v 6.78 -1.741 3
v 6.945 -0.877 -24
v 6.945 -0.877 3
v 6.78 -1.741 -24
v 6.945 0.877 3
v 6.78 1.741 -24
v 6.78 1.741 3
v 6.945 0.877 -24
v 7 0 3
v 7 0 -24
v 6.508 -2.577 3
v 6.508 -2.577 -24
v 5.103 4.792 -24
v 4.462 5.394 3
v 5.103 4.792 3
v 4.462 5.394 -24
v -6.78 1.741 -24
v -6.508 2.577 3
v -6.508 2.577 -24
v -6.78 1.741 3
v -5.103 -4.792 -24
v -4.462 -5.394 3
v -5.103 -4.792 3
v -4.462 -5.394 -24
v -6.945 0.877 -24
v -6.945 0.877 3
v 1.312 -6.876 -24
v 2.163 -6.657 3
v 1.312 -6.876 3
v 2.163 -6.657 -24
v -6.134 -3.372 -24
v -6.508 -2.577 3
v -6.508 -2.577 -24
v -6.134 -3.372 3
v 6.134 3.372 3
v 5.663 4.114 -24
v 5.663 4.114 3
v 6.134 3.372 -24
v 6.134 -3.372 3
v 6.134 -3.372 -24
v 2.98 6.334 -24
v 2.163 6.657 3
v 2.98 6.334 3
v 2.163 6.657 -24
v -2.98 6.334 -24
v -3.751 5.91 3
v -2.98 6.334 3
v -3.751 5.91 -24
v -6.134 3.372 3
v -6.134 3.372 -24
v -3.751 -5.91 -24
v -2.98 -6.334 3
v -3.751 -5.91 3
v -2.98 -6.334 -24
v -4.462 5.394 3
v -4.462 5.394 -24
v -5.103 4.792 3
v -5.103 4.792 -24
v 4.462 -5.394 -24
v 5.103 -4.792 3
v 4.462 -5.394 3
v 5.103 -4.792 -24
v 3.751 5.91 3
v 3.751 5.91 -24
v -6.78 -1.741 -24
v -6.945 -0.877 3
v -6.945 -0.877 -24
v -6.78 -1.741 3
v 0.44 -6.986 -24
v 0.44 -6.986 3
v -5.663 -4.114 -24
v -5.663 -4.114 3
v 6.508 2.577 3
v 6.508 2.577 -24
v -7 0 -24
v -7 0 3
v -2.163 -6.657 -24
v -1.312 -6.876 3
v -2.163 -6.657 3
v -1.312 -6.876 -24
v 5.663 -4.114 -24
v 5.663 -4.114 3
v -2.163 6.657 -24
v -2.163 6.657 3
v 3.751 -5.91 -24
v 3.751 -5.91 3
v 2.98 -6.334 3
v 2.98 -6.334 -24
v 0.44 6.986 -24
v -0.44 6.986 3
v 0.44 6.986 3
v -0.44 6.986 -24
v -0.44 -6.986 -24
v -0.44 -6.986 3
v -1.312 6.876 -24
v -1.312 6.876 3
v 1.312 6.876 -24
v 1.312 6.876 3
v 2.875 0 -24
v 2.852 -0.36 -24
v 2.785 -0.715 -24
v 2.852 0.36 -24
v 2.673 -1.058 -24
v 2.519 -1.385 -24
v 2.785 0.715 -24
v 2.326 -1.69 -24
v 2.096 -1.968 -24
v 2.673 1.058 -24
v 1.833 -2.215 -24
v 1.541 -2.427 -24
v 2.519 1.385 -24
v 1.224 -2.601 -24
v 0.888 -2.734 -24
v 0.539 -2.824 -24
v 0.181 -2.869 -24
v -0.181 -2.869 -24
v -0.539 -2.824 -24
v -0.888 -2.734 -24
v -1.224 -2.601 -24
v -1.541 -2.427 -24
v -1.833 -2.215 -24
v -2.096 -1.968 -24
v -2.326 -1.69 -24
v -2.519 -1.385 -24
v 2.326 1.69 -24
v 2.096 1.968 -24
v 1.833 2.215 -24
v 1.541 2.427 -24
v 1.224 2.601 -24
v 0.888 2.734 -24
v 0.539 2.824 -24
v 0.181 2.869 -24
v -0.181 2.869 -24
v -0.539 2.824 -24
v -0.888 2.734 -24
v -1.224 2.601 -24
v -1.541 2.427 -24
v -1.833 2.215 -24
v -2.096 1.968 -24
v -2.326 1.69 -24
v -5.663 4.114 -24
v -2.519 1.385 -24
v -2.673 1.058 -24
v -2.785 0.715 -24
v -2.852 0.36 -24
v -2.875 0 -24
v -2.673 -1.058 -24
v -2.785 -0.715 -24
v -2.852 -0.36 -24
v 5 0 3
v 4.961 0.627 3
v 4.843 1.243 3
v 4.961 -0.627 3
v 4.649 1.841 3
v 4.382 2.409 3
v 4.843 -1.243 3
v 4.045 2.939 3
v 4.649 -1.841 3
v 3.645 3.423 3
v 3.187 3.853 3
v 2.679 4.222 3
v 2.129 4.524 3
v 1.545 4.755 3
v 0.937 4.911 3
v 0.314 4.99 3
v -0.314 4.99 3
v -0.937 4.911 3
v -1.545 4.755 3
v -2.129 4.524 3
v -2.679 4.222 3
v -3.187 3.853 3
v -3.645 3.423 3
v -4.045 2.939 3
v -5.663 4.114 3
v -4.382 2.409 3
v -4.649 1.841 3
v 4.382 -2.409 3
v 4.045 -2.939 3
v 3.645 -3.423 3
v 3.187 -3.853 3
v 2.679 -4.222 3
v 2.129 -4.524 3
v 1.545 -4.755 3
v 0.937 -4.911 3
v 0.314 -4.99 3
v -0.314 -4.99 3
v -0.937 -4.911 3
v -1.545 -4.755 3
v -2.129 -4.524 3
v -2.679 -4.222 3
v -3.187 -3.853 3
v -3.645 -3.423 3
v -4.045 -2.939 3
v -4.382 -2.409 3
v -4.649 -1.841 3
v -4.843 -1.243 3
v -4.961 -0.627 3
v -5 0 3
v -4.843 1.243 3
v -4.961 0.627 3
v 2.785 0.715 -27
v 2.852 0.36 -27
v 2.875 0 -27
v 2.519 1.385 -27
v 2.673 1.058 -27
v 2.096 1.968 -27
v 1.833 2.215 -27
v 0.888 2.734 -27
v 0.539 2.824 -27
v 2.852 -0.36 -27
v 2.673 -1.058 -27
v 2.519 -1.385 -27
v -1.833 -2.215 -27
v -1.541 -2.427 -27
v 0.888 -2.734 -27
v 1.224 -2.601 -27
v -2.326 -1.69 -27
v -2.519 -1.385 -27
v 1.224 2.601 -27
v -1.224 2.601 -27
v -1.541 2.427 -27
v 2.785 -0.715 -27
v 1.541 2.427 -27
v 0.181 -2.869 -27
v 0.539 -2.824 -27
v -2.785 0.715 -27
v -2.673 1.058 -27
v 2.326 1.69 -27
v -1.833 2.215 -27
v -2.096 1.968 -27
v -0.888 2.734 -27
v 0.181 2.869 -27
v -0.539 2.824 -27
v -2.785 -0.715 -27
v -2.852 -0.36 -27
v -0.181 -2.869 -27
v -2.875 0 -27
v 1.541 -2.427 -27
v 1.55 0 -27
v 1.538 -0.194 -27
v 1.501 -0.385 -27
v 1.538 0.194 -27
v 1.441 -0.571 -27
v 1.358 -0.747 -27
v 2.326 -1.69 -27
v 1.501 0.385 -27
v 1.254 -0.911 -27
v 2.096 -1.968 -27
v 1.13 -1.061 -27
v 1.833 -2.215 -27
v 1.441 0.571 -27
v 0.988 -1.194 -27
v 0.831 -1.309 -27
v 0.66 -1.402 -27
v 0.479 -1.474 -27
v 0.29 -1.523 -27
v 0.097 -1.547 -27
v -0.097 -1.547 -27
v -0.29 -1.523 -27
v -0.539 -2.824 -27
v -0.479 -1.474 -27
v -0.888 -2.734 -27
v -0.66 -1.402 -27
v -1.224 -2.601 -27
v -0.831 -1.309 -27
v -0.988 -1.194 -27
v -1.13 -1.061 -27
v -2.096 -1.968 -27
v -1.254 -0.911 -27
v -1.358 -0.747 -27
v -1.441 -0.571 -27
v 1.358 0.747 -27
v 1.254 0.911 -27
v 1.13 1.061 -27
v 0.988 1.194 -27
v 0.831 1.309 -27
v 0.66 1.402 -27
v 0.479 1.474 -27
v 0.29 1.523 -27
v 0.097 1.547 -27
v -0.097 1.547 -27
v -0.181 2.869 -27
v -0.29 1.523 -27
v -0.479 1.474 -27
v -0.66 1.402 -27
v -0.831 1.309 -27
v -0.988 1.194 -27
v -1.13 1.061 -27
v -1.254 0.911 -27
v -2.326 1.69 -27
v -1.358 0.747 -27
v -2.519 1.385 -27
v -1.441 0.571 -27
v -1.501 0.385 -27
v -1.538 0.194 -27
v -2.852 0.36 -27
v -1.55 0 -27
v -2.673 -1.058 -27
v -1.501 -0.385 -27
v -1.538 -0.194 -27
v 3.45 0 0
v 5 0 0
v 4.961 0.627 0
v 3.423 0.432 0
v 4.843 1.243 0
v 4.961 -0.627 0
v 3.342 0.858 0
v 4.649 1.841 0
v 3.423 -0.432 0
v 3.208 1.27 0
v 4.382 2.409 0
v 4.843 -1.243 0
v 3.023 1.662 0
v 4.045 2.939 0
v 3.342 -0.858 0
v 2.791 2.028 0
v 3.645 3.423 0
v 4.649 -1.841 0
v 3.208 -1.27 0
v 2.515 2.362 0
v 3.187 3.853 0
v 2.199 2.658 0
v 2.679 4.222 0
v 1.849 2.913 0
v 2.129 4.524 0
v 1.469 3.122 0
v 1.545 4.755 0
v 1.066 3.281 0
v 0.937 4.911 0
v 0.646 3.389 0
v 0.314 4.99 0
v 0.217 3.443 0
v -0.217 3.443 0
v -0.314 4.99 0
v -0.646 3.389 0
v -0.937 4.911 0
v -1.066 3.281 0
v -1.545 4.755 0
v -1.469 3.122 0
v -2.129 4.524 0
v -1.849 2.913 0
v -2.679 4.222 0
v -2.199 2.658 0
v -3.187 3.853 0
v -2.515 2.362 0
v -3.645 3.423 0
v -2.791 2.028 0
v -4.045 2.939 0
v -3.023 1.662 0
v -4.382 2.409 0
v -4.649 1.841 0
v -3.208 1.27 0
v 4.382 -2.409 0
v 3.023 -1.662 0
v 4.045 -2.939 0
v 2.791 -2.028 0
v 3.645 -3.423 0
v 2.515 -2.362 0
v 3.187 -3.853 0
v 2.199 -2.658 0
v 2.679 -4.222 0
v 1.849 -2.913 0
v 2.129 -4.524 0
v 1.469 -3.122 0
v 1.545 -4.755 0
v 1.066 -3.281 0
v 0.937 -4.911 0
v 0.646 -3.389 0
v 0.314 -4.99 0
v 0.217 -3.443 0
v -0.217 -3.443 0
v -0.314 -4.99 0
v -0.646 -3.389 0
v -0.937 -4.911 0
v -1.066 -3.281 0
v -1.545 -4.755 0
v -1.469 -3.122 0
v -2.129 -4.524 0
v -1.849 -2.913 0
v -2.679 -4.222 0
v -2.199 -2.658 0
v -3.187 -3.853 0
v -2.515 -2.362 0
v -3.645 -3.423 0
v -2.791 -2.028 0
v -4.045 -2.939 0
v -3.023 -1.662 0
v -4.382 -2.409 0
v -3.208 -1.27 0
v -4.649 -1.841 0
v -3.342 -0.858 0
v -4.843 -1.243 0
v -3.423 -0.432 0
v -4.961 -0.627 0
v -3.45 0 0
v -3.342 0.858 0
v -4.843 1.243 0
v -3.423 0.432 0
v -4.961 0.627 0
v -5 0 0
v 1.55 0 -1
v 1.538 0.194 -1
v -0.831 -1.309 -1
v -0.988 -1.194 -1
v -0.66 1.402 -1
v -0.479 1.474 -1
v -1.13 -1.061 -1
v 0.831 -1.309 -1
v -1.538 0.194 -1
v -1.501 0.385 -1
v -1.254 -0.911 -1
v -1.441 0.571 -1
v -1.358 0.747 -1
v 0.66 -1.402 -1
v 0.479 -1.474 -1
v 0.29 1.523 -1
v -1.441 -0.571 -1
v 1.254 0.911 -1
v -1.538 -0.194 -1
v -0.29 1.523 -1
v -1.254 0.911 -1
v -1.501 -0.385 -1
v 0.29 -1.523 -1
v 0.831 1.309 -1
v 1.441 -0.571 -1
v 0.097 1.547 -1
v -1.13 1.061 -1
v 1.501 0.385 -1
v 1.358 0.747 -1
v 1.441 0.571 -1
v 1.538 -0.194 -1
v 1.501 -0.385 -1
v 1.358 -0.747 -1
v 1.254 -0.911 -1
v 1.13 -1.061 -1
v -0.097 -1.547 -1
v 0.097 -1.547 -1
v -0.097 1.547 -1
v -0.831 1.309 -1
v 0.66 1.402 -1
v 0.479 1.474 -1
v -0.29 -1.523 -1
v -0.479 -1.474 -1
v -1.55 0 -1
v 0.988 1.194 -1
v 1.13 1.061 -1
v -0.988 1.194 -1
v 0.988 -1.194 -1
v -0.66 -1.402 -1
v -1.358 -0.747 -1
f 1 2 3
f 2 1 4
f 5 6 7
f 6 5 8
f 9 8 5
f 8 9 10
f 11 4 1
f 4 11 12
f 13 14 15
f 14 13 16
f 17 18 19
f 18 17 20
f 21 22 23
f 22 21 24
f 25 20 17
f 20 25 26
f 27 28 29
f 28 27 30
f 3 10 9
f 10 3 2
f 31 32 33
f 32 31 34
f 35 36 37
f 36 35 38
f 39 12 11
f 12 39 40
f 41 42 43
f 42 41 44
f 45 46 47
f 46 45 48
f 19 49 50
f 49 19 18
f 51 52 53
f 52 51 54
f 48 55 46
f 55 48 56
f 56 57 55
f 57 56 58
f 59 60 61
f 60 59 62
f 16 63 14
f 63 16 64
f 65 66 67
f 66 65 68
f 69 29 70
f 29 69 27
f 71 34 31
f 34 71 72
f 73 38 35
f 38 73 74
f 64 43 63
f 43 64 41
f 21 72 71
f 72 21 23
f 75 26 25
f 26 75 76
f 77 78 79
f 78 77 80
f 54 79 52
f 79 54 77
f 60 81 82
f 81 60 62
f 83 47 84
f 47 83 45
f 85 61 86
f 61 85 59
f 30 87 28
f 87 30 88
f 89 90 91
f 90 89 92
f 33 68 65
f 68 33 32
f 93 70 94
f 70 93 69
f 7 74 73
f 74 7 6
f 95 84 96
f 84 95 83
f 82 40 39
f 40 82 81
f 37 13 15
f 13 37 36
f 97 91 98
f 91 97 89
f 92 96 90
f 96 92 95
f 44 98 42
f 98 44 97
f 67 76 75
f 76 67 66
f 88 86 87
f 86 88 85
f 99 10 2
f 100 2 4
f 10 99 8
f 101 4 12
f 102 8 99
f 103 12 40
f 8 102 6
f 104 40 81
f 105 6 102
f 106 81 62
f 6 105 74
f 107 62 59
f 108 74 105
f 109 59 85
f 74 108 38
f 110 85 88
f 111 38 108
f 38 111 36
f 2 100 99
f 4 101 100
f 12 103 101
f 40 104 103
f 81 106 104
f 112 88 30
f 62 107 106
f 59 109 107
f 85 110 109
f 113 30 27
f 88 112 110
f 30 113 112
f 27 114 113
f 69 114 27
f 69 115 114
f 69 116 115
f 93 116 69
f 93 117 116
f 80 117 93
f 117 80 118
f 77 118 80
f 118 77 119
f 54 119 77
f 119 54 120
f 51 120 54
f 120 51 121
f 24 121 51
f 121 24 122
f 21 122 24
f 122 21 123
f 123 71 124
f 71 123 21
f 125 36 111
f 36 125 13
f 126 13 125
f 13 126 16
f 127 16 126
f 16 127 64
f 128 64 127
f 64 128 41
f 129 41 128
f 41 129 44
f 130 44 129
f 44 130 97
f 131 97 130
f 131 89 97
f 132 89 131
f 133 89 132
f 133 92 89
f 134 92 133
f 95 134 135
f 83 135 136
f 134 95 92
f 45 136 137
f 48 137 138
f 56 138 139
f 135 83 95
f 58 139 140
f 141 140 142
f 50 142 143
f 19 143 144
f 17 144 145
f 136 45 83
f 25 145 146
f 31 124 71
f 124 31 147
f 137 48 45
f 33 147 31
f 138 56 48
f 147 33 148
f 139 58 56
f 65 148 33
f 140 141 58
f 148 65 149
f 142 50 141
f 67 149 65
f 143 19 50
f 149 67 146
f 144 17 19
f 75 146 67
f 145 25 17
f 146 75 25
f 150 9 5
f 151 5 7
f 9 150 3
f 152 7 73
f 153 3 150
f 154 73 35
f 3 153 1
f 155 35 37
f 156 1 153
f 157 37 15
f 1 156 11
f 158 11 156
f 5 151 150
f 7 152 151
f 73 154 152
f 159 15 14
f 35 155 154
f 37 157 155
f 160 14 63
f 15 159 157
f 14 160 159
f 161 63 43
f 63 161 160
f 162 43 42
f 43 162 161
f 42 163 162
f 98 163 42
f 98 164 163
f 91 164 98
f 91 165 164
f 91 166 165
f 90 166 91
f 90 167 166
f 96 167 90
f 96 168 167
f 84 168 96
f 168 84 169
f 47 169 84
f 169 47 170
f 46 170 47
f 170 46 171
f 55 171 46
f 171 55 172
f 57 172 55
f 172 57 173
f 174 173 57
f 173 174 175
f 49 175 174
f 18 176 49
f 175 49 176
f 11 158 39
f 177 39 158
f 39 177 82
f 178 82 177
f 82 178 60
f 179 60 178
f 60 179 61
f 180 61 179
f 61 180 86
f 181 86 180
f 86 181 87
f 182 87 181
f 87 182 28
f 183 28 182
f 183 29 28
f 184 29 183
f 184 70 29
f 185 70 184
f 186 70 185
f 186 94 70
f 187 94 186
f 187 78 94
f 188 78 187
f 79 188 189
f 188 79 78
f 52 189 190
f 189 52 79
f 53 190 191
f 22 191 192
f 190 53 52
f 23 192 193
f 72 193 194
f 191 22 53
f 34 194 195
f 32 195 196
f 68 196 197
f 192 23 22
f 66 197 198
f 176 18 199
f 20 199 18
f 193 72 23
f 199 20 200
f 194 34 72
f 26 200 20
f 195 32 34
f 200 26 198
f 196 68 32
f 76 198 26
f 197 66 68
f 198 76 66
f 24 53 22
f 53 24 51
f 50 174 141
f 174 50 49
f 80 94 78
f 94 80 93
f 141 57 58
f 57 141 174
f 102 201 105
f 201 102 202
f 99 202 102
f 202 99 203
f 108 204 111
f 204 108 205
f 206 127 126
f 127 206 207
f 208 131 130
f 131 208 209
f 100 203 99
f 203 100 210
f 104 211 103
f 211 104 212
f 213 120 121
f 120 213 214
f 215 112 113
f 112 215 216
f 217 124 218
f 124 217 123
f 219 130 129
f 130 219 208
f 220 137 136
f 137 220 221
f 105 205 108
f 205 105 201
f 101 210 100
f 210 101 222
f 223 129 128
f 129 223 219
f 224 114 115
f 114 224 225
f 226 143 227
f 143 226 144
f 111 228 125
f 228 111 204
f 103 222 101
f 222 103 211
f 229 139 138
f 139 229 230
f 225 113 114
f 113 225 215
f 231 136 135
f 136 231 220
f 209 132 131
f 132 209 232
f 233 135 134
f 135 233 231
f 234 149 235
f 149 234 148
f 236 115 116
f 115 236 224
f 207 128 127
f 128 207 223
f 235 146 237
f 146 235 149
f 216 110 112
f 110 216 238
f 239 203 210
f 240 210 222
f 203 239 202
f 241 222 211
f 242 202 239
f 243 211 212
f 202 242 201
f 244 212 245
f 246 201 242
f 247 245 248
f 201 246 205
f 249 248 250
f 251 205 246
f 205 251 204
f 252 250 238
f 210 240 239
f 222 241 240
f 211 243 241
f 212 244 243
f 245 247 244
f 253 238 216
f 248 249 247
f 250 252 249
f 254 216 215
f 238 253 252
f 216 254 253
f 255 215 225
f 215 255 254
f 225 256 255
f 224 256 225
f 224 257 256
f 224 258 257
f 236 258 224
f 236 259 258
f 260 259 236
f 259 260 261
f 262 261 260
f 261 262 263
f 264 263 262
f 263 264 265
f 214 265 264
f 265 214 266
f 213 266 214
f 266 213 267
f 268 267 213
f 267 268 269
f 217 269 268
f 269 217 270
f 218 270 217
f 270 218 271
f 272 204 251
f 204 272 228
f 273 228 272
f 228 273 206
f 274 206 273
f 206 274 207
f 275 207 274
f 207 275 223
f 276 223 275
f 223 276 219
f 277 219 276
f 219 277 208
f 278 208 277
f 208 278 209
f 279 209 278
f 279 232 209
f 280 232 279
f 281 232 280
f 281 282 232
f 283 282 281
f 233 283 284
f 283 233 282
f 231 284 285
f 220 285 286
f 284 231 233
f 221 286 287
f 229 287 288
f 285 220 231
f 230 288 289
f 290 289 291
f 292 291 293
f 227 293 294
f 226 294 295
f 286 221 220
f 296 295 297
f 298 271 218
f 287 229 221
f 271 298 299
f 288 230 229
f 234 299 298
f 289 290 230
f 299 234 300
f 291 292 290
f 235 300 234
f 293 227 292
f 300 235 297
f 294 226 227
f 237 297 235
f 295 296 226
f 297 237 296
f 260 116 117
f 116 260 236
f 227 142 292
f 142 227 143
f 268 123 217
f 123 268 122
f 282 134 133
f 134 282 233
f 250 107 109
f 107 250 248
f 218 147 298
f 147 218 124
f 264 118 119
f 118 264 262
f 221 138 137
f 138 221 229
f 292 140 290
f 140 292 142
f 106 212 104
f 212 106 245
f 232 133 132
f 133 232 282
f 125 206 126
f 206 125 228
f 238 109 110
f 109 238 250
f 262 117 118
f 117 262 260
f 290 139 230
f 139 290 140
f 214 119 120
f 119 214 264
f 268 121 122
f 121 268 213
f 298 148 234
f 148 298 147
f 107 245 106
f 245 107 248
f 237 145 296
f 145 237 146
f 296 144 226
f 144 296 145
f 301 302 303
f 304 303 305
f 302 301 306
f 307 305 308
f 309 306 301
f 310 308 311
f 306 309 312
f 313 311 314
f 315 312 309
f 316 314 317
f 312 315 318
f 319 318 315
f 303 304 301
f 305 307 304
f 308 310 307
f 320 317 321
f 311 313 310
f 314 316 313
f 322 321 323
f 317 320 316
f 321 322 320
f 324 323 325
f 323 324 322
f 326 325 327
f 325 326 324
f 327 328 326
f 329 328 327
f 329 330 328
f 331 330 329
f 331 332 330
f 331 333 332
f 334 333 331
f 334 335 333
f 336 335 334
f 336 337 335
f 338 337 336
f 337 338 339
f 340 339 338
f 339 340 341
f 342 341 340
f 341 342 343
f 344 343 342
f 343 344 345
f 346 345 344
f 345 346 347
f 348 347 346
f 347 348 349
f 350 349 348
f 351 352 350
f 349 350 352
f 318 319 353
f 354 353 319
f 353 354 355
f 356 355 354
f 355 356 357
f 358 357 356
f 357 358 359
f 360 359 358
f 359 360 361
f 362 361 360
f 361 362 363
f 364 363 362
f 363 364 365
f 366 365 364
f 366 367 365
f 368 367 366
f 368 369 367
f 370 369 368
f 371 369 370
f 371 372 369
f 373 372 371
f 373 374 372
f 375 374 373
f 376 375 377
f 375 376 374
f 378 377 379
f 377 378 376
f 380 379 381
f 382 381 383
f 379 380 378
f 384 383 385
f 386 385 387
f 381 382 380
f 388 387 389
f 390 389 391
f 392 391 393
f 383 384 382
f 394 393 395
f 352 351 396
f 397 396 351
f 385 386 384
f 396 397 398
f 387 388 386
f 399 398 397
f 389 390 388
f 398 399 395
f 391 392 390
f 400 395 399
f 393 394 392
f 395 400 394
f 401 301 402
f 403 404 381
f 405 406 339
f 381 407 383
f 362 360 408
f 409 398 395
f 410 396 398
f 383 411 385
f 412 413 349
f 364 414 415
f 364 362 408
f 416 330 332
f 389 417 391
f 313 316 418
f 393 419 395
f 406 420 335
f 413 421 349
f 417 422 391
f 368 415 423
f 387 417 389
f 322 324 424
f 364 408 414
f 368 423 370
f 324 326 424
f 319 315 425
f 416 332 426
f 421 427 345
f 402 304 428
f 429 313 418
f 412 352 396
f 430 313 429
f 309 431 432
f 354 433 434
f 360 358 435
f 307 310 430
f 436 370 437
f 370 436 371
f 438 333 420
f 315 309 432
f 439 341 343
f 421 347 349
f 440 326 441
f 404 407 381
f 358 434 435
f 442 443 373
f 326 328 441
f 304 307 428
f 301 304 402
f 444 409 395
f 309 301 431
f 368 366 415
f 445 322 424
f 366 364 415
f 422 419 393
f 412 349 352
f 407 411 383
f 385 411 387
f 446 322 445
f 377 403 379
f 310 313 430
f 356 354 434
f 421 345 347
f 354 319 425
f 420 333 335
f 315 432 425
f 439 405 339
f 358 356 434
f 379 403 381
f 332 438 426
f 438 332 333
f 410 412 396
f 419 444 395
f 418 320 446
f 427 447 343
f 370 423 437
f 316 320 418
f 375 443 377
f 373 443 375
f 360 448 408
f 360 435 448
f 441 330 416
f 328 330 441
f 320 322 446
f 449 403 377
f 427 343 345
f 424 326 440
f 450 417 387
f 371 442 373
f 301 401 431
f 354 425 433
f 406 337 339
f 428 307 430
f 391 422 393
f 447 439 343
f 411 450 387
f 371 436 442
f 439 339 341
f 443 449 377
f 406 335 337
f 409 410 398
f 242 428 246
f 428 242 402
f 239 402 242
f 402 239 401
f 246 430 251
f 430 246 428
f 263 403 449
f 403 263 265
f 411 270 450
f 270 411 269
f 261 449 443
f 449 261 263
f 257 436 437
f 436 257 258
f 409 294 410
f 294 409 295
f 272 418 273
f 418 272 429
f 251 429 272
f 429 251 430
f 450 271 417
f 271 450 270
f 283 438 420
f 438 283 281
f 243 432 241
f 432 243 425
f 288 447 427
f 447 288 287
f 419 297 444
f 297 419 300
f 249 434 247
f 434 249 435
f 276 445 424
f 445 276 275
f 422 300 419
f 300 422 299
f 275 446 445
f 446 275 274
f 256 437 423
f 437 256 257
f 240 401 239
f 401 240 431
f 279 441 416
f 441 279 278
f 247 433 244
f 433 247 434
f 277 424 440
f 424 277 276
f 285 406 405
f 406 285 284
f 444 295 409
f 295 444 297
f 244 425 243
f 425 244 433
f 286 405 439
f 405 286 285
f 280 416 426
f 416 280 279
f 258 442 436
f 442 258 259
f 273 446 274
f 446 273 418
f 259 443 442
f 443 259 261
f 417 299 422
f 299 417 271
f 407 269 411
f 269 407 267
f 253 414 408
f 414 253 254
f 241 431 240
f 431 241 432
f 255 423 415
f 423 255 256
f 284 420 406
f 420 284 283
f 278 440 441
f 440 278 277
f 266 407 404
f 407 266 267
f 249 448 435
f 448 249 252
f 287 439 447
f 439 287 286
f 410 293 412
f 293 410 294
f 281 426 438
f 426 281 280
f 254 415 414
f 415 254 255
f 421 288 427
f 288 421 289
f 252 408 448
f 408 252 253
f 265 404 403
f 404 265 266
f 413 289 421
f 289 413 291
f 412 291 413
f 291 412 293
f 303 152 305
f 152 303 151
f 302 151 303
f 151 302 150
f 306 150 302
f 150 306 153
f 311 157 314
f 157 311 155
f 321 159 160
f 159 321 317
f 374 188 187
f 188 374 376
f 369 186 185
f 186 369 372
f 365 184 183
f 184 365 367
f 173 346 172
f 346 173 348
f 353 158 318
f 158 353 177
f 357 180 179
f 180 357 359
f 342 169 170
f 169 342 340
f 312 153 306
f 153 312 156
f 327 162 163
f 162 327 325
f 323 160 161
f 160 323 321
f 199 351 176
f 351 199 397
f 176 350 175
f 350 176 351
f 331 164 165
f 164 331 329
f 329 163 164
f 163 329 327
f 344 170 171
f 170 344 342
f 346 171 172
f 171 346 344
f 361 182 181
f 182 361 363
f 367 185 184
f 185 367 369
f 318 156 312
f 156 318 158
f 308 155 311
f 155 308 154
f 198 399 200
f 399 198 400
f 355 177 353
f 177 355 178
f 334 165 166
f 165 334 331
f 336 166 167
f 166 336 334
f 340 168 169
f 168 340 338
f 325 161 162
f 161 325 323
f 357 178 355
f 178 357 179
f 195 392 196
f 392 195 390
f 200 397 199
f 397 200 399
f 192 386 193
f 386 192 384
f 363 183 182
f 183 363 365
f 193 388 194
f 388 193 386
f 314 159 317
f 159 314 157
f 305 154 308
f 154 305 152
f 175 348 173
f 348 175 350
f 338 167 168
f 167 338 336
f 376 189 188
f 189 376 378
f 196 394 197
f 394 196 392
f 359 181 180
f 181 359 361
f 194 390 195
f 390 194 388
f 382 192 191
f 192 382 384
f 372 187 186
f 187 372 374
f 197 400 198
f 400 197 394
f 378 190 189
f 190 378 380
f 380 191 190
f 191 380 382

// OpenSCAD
$fn = 50;

difference() {
	union() {
		translate(v = [0, 0, -24.0]) {
			cylinder(h = 27, r = 7.0);
		}
		#translate(v = [0, 0, -27.0]) {
			cylinder(h = 27, r = 2.875);
		}
	}
	union() {
		translate(v = [0, 0, 0]) {
			rotate(a = [0, 0, 0]) {
				difference() {
					union() {
						translate(v = [0, 0, -27.0]) {
							cylinder(h = 27, r = 1.25);
						}
						translate(v = [0, 0, -1.0]) {
							cylinder(h = 1.0, r1 = 1.55, r2 = 3.45);
						}
						translate(v = [0, 0, -27.0]) {
							cylinder(h = 27, r = 1.55);
						}
						translate(v = [0, 0, -27.0]) {
							cylinder(h = 27, r = 1.25);
						}
					}
					union();
				}
			}
		}
		#cylinder(h = 3, r = 5.0);
	}
}
